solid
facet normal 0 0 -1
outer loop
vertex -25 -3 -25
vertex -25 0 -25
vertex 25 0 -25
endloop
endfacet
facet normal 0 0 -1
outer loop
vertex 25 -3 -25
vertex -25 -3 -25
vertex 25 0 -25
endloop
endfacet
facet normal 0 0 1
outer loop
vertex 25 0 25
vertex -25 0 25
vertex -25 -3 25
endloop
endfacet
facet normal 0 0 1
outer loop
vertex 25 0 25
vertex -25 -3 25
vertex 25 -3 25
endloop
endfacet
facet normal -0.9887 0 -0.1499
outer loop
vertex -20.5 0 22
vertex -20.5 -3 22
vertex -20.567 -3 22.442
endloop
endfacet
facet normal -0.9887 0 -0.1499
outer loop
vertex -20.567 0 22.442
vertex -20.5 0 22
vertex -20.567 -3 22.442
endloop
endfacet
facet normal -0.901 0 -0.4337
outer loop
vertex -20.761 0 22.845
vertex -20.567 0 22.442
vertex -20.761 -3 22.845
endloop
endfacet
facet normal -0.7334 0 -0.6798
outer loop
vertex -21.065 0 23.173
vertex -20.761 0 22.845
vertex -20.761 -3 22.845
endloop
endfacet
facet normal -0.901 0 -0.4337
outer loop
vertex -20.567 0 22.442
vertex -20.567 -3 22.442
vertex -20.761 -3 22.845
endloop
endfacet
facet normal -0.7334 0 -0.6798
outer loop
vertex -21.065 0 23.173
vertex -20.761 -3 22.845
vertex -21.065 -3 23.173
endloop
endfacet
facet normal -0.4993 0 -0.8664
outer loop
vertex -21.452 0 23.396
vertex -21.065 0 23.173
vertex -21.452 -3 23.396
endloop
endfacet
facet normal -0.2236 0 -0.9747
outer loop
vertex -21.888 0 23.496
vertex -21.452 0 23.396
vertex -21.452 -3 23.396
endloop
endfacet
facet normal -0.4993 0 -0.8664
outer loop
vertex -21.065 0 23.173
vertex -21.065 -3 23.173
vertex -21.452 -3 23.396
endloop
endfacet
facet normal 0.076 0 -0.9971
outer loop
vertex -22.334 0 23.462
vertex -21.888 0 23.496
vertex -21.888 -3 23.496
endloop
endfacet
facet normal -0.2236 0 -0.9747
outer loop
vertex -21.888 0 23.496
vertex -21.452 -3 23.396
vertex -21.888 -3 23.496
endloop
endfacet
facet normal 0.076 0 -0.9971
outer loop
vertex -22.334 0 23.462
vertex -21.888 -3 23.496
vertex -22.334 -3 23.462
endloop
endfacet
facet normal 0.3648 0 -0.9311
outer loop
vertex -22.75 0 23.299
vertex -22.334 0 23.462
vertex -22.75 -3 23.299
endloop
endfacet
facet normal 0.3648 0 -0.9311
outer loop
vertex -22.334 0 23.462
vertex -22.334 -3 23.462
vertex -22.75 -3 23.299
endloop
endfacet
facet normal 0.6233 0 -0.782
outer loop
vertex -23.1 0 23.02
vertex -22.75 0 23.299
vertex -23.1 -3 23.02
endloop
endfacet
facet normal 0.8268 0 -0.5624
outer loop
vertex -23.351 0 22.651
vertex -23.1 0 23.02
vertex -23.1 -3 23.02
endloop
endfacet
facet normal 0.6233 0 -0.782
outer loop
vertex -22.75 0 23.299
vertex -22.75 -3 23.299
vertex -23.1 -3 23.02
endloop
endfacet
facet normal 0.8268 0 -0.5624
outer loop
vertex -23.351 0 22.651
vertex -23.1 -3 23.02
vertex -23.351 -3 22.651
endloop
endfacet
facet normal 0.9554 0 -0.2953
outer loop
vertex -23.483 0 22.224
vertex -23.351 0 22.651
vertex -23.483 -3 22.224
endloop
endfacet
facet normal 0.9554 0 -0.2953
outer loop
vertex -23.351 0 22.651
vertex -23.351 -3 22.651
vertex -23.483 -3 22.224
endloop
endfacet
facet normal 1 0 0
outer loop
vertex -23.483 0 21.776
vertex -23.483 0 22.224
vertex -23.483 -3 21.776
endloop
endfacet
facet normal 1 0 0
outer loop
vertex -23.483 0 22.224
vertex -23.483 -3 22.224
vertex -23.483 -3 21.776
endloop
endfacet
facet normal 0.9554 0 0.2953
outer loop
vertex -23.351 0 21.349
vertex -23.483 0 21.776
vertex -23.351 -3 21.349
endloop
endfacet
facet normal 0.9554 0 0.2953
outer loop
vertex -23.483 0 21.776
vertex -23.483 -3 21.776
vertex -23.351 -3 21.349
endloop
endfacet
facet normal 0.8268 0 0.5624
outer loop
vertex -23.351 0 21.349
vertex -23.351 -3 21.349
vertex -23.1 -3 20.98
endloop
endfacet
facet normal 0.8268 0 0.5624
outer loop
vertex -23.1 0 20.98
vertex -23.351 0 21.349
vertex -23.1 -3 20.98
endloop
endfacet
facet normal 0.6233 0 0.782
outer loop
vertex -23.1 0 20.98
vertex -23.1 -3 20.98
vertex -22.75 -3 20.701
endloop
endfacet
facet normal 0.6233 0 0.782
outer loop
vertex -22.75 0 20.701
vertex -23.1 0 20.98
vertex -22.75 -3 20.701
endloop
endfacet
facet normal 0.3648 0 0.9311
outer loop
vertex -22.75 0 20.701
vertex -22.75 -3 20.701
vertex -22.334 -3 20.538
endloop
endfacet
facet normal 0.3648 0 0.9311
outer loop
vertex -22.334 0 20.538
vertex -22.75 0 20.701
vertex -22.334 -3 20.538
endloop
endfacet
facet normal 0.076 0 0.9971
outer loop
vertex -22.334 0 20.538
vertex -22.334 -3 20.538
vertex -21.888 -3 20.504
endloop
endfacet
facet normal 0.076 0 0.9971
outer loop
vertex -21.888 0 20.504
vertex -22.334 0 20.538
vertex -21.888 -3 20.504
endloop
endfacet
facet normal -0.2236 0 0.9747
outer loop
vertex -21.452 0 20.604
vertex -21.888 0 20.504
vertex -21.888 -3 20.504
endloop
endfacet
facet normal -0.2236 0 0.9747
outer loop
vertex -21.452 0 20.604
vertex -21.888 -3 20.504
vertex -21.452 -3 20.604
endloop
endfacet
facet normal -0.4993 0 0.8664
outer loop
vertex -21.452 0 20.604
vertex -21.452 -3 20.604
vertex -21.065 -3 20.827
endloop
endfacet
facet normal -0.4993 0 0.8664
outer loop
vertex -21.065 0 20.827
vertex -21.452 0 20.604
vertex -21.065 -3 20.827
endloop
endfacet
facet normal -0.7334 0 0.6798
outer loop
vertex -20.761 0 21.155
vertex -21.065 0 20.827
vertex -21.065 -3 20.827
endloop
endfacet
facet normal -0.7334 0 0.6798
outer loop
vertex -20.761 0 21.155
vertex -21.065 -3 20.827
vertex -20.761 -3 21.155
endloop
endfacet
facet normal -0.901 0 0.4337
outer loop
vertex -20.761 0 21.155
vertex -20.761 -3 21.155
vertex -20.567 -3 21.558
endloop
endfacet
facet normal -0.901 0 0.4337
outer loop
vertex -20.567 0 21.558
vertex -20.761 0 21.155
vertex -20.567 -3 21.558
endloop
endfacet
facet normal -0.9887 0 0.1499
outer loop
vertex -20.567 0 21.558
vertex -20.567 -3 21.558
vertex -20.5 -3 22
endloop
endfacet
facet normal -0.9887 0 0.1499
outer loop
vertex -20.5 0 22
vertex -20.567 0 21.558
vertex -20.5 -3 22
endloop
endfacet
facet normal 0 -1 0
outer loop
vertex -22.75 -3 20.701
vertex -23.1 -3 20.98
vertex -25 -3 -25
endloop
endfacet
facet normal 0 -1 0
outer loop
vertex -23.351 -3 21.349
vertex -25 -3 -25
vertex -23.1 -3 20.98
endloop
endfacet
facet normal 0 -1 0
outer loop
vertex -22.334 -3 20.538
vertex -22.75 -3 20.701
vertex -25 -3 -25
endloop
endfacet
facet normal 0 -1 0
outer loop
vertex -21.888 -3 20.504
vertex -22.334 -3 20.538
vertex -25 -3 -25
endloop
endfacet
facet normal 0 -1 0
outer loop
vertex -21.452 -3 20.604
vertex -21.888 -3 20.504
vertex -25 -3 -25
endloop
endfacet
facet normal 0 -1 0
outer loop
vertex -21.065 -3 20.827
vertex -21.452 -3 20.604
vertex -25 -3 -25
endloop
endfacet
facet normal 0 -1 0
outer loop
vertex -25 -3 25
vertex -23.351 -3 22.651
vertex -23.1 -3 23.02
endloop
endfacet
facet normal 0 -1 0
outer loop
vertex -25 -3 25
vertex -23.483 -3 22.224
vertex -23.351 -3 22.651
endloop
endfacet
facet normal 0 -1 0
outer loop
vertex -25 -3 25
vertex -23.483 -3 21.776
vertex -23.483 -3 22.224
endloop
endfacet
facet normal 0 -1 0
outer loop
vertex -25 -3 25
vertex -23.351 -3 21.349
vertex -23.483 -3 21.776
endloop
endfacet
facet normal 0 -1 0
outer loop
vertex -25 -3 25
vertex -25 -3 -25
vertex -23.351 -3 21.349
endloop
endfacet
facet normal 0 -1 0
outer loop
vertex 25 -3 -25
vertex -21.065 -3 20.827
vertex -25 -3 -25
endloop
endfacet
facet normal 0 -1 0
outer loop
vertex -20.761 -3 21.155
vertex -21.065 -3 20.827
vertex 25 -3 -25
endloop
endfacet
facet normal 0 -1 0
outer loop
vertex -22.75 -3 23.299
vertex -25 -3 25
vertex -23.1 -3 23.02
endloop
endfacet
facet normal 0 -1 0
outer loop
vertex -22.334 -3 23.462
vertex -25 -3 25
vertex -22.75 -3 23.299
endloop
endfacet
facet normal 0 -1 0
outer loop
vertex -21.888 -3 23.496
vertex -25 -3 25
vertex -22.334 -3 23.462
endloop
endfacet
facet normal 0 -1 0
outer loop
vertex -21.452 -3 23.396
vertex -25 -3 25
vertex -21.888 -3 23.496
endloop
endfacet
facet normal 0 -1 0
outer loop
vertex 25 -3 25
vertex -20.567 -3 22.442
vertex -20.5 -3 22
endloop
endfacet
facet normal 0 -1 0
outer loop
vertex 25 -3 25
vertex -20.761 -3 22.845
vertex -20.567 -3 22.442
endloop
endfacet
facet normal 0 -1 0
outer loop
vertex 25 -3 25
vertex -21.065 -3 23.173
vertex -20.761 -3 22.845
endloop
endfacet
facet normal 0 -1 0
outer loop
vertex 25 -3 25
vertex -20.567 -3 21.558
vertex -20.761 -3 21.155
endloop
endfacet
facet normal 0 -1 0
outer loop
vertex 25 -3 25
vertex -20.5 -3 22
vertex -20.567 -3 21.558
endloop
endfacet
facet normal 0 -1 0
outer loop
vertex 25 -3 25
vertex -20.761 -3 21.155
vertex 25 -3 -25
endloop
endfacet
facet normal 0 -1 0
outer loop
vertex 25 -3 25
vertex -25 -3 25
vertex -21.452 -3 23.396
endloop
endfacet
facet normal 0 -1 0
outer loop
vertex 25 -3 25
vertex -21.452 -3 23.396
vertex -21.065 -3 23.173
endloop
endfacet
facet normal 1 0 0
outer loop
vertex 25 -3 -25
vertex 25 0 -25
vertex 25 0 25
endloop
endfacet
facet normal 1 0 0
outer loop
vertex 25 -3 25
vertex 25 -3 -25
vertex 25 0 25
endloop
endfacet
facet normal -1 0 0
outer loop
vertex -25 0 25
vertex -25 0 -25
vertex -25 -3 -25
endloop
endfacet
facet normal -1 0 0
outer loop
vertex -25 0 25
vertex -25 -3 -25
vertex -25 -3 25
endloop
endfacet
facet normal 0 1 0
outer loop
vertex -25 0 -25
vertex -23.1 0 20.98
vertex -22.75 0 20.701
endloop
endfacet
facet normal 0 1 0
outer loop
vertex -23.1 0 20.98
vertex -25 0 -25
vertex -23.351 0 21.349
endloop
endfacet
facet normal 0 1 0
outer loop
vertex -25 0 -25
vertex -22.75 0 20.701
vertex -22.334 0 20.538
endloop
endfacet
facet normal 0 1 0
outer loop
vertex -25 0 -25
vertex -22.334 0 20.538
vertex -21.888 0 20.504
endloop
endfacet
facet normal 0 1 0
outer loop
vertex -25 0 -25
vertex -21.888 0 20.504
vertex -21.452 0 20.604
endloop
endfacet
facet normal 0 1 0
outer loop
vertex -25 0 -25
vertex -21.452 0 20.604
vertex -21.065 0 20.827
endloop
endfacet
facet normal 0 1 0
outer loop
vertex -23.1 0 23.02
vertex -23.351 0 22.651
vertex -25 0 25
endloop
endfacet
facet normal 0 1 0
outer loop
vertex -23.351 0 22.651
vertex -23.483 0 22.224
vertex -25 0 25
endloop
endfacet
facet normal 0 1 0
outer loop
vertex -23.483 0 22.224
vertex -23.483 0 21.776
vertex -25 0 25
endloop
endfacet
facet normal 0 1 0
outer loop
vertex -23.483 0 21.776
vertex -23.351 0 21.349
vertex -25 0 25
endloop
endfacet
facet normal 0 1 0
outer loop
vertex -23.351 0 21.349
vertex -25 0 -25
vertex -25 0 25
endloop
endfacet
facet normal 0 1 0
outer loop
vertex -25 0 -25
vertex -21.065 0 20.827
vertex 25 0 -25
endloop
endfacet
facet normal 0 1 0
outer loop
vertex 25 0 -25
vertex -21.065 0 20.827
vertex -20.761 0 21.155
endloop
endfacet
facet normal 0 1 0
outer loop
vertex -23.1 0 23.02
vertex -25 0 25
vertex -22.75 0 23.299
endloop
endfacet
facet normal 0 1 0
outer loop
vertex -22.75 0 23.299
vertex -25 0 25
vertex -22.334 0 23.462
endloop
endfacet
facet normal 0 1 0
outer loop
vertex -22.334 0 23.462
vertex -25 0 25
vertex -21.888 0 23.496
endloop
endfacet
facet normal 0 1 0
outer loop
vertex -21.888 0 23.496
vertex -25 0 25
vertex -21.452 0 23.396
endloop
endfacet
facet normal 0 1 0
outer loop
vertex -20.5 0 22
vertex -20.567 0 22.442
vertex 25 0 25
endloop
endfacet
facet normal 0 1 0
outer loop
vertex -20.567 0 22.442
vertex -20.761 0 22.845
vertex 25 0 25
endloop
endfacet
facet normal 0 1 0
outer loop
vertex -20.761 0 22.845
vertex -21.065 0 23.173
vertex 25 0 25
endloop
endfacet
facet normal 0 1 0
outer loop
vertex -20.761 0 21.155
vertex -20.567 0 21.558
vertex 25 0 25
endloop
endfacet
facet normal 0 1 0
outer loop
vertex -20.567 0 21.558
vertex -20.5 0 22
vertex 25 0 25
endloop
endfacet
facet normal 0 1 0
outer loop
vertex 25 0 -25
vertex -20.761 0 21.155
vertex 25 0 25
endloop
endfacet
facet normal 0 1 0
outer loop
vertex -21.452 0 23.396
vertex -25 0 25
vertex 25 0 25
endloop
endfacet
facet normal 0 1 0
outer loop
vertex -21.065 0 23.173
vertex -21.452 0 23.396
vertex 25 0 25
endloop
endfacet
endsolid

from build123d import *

# Parameters (mm, degrees)
F0_W     = 50
F0_H     = 50
F1_DEPTH = 3
F2_R     = 1.5
F3_DEPTH = 25


with BuildPart() as f1:
    # F0 (on Front) → F1 (new body)
    with BuildSketch(Plane.XZ):
        Rectangle(F0_W, F0_H)
    extrude(amount=F1_DEPTH)

    # F2 (on face) → F3 (cut)
    with BuildSketch(Plane.XZ.offset(3)):
        with Locations((-22, 22)):
            Circle(F2_R)
    extrude(amount=-F3_DEPTH, mode=Mode.SUBTRACT)


solid = f1.part
